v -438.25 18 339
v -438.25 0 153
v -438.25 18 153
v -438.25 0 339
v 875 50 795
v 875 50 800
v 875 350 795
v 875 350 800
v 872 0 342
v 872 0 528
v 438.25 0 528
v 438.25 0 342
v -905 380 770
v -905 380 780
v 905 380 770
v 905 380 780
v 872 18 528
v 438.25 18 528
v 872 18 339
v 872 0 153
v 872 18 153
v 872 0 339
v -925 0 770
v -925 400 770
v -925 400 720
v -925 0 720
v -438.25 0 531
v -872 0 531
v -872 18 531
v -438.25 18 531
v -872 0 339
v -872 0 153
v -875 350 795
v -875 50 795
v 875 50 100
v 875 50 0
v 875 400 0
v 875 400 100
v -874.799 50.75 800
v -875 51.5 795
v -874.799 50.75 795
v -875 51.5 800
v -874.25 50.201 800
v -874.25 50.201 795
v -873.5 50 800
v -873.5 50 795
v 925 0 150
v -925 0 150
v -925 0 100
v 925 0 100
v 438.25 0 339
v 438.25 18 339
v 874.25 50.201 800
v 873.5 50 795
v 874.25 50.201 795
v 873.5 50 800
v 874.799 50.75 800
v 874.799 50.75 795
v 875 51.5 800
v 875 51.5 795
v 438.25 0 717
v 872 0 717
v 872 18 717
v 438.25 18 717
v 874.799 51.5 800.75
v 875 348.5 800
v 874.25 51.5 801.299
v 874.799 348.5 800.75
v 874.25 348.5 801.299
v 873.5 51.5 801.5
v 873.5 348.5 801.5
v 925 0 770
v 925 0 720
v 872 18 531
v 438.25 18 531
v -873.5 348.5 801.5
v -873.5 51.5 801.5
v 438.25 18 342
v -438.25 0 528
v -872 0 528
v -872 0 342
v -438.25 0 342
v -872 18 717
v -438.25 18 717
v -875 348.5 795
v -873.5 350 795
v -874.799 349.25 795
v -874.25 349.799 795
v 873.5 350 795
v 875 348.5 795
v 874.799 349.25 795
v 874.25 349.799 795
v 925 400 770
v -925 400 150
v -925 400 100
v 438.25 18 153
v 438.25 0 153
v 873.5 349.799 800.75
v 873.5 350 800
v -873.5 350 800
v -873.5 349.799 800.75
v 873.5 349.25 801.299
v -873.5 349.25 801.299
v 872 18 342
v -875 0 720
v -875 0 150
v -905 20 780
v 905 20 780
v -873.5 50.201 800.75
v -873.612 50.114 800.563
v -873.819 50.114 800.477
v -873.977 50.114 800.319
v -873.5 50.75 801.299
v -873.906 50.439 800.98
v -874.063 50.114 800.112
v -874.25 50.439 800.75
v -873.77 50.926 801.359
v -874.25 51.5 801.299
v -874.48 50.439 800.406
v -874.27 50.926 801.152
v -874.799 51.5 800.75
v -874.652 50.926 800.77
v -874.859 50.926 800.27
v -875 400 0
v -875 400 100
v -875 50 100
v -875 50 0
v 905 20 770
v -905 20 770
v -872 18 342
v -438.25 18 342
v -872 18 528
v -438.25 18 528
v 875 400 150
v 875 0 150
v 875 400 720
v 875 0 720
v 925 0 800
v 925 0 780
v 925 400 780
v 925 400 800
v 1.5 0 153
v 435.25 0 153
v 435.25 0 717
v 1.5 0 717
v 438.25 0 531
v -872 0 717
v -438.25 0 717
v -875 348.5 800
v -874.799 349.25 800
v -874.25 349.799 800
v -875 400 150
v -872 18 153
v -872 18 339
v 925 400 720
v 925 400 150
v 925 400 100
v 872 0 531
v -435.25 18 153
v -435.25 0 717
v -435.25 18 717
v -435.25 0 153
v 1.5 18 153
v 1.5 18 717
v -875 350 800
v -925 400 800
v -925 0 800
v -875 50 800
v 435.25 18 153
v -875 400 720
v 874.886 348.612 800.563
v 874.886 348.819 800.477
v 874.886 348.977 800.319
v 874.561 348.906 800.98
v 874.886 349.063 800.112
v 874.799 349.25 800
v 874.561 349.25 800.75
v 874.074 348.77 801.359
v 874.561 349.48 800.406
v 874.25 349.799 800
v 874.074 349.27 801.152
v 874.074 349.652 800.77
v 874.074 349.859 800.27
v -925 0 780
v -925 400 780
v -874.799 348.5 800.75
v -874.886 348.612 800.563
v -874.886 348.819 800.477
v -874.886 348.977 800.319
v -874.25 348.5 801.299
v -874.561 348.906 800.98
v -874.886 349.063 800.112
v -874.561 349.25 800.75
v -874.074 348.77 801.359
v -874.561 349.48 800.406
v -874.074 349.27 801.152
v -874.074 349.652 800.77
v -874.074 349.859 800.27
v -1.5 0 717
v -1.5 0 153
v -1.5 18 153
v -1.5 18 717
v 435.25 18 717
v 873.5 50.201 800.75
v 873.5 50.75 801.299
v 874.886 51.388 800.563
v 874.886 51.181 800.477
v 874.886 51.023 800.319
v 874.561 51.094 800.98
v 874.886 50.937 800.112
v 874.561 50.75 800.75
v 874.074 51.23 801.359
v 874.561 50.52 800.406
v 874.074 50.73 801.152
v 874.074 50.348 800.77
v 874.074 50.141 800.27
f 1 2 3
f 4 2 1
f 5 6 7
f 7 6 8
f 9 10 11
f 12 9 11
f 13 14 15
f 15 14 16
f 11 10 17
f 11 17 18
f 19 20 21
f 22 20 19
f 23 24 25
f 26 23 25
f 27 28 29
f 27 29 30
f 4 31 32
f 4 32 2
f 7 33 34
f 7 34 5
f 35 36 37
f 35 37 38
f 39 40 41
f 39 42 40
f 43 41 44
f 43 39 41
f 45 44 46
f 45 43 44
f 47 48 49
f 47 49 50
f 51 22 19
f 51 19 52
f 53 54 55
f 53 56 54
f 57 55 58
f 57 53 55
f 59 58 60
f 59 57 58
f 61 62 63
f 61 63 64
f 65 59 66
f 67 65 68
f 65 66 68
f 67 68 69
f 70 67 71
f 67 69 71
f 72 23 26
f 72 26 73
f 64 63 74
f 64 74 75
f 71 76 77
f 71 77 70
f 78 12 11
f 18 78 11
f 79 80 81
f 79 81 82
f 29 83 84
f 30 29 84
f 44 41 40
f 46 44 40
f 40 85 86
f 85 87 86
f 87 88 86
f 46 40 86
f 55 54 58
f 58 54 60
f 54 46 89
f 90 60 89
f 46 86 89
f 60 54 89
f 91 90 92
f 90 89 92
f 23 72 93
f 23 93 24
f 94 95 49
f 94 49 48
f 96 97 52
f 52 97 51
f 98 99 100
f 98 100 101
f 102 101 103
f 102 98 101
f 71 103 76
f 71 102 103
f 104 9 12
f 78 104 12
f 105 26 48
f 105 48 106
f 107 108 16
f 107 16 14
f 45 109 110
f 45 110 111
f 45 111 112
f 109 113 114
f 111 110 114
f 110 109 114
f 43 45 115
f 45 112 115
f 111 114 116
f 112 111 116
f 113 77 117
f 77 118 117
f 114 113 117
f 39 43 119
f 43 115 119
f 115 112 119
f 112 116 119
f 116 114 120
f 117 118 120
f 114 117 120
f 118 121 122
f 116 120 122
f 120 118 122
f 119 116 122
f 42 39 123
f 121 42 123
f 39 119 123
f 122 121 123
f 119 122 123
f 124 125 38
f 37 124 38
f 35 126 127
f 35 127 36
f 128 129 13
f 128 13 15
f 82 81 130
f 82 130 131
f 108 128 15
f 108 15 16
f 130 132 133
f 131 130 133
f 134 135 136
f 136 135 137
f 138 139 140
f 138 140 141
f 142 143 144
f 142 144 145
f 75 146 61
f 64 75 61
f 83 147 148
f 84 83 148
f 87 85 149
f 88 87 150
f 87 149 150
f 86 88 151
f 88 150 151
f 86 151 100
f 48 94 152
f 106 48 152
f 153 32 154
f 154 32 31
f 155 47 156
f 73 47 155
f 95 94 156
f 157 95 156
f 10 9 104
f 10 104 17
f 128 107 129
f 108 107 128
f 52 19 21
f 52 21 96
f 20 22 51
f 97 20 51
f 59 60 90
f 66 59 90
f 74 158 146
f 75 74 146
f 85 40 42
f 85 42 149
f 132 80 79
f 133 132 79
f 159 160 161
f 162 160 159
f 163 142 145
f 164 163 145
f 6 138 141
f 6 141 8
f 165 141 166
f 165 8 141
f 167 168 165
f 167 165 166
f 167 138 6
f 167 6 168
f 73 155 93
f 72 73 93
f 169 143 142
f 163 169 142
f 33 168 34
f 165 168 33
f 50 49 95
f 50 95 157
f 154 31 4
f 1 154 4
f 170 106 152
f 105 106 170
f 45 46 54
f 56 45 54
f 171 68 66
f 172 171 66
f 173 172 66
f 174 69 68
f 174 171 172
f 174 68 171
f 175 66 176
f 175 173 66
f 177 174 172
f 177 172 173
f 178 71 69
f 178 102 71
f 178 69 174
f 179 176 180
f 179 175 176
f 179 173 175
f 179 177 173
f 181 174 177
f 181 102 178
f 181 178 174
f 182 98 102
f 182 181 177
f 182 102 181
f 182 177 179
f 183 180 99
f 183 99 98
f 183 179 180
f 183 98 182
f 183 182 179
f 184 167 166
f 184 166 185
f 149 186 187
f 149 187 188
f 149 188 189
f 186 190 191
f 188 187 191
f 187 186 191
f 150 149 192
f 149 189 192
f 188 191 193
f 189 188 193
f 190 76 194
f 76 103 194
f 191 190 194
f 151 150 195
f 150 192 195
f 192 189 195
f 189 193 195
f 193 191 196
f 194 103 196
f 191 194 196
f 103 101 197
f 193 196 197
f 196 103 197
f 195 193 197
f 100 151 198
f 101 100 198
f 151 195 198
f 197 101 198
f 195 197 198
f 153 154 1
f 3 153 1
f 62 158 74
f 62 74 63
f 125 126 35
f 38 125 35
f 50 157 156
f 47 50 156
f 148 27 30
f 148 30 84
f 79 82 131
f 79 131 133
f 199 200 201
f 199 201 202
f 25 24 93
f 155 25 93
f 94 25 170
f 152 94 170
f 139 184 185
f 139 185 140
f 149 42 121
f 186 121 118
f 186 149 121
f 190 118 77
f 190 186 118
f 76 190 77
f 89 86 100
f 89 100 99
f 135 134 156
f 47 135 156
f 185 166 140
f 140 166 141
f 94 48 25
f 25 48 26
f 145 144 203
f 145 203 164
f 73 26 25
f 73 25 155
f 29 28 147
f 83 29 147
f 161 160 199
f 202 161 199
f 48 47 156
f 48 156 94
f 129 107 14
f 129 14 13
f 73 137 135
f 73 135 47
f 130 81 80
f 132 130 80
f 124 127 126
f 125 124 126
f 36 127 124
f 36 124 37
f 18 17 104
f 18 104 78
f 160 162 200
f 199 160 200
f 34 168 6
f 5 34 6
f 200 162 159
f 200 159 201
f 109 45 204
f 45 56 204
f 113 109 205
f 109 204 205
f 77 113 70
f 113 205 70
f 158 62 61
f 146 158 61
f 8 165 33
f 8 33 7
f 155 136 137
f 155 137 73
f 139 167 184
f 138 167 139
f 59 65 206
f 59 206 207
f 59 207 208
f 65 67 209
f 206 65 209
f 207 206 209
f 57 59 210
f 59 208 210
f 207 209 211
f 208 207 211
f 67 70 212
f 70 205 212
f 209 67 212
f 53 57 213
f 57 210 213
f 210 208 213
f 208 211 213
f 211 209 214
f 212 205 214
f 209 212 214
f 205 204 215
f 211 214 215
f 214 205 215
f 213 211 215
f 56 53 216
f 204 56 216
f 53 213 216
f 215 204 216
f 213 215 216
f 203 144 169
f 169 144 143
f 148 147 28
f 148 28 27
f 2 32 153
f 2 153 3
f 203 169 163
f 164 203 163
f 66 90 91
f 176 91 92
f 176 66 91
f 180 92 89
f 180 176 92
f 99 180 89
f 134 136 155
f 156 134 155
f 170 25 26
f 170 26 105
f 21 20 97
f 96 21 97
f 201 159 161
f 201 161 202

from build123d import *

# Parameters (mm, degrees)
F1_DEPTH  = 400
F0_W      = 50
F0_H      = 50
F0_W_2    = 1750
F0_H_2    = 570
F2_DEPTH  = 400
F3_START  = -50
F0_H_3    = 100
F3_DEPTH  = 350
F0_W_3    = 433.75
F0_H_4    = 186
F4_DEPTH  = 18
F0_H_5    = 3
F5_START  = -20
F5_DEPTH  = 360
F6_DEPTH  = 400
F9_W      = 1750
F9_H      = 300
F10_DEPTH = 5
F11_DEPTH = 6.5
F12_R     = 1.5


# Not quite as in the source:
# - a feature names something its author has since deleted; it is built from what else it names


with BuildPart() as f1:
    # F0 (on Front) → F1 (new body)
    with BuildSketch(Plane.XZ):
        Polygon((905, 770), (-875, 770), (-875, 720), (-872, 720), (875, 720), (925, 720), (925, 770), align=None)
        Polygon((-905, 770), (-925, 770), (-925, 720), (-875, 720), (-875, 770), align=None)
    extrude(amount=-F1_DEPTH)


with BuildPart() as f1b:
    # F0 (on Front) → F1, piece 2 (new body)
    with BuildSketch(Plane.XZ):
        with Locations((-900, 125)):
            Rectangle(F0_W, F0_H)
        with Locations((0, 125)):
            Rectangle(F0_W_2, F0_H)
        with Locations((900, 125)):
            Rectangle(F0_W, F0_H)
    extrude(amount=-F1_DEPTH)


with BuildPart() as f2:
    # F0 (on Front) → F2 (new body)
    with BuildSketch(Plane.XZ):
        with Locations((-900, 435)):
            Rectangle(F0_W, F0_H_2)
    extrude(amount=-F2_DEPTH)


with BuildPart() as f2b:
    # F0 (on Front) → F2, piece 2 (new body)
    with BuildSketch(Plane.XZ):
        with Locations((900, 435)):
            Rectangle(F0_W, F0_H_2)
    extrude(amount=-F2_DEPTH)


with BuildPart() as f3:
    # F0 (on Front) → F3 (new body)
    with BuildSketch(Plane.XZ.offset(F3_START)):
        with Locations((0, 50)):
            Rectangle(F0_W_2, F0_H_3)
    extrude(amount=-F3_DEPTH)


with BuildPart() as f4:
    # F0 (on Front) → F4 (new body)
    with BuildSketch(Plane.XZ):
        with Locations((-655.125, 435)):
            Rectangle(F0_W_3, F0_H_4)
    extrude(amount=-F4_DEPTH)


with BuildPart() as f4b:
    # F0 (on Front) → F4, piece 2 (new body)
    with BuildSketch(Plane.XZ):
        with Locations((-655.125, 246)):
            Rectangle(F0_W_3, F0_H_4)
    extrude(amount=-F4_DEPTH)


with BuildPart() as f4c:
    # F0 (on Front) → F4, piece 3 (new body)
    with BuildSketch(Plane.XZ):
        with Locations((-218.375, 435)):
            Rectangle(F0_W_3, F0_H_4)
        with Locations((-218.375, 246)):
            Rectangle(F0_W_3, F0_H_4)
        with Locations((-218.375, 340.5)):
            Rectangle(F0_W_3, F0_H_5)
        with Locations((-218.375, 624)):
            Rectangle(F0_W_3, F0_H_4)
        with Locations((-218.375, 529.5)):
            Rectangle(F0_W_3, F0_H_5)
    extrude(amount=-F4_DEPTH)


with BuildPart() as f4d:
    # F0 (on Front) → F4, piece 4 (new body)
    with BuildSketch(Plane.XZ):
        with Locations((-655.125, 624)):
            Rectangle(F0_W_3, F0_H_4)
    extrude(amount=-F4_DEPTH)


with BuildPart() as f5:
    # F0 (on Front) → F5 (new body)
    with BuildSketch(Plane.XZ.offset(F5_START)):
        Polygon((-905, 780), (-905, 770), (-875, 770), (905, 770), (905, 780), align=None)
    extrude(amount=-F5_DEPTH)


with BuildPart() as f6:
    # F0 (on Front) → F6 (new body)
    with BuildSketch(Plane.XZ):
        Polygon((-925, 780), (-905, 780), (905, 780), (925, 780), (925, 800), (-925, 800), align=None)
    extrude(amount=-F6_DEPTH)

    # F9 (on face) → F10 (cut)
    with BuildSketch(Plane.XY.offset(800)):
        with Locations((0, 200)):
            Rectangle(F9_W, F9_H)
    extrude(amount=-F10_DEPTH, mode=Mode.SUBTRACT)


with BuildPart() as f8_1:
    # F8: instance of F4d
    add(f4d.part.mirror(Plane(origin=(0, 9, 435), x_dir=(0, 1, 0), z_dir=(1, 0, 0))))


with BuildPart() as f8_2:
    # F8: instance of F4
    add(f4.part.mirror(Plane(origin=(0, 9, 435), x_dir=(0, 1, 0), z_dir=(1, 0, 0))))


with BuildPart() as f8_3:
    # F8: instance of F4b
    add(f4b.part.mirror(Plane(origin=(0, 9, 435), x_dir=(0, 1, 0), z_dir=(1, 0, 0))))


with BuildPart() as f8_4:
    # F8: instance of F4c
    add(f4c.part.mirror(Plane(origin=(0, 9, 435), x_dir=(0, 1, 0), z_dir=(1, 0, 0))))


with BuildPart() as f11:
    # F11 (new): a face of the model
    f11_faces = [f6.part.faces().sort_by_distance(p)[0] for p in [
        (0, 200, 795),
    ]]
    extrude(f11_faces, amount=F11_DEPTH)

    # F12
    f12_edges = [f11.edges().sort_by_distance(p)[0] for p in [
        (0, 350, 801.5),
        (-875, 200, 801.5),
        (0, 50, 801.5),
        (875, 200, 801.5),
        (-875, 50, 798.25),
        (-875, 350, 798.25),
        (875, 350, 798.25),
        (875, 50, 798.25),
    ]]
    fillet(f12_edges, radius=F12_R)


solid = Compound([f1.part, f1b.part, f2.part, f2b.part, f3.part, f4.part, f4b.part, f4c.part, f4d.part, f5.part, f6.part, f8_1.part, f8_2.part, f8_3.part, f8_4.part, f11.part])
